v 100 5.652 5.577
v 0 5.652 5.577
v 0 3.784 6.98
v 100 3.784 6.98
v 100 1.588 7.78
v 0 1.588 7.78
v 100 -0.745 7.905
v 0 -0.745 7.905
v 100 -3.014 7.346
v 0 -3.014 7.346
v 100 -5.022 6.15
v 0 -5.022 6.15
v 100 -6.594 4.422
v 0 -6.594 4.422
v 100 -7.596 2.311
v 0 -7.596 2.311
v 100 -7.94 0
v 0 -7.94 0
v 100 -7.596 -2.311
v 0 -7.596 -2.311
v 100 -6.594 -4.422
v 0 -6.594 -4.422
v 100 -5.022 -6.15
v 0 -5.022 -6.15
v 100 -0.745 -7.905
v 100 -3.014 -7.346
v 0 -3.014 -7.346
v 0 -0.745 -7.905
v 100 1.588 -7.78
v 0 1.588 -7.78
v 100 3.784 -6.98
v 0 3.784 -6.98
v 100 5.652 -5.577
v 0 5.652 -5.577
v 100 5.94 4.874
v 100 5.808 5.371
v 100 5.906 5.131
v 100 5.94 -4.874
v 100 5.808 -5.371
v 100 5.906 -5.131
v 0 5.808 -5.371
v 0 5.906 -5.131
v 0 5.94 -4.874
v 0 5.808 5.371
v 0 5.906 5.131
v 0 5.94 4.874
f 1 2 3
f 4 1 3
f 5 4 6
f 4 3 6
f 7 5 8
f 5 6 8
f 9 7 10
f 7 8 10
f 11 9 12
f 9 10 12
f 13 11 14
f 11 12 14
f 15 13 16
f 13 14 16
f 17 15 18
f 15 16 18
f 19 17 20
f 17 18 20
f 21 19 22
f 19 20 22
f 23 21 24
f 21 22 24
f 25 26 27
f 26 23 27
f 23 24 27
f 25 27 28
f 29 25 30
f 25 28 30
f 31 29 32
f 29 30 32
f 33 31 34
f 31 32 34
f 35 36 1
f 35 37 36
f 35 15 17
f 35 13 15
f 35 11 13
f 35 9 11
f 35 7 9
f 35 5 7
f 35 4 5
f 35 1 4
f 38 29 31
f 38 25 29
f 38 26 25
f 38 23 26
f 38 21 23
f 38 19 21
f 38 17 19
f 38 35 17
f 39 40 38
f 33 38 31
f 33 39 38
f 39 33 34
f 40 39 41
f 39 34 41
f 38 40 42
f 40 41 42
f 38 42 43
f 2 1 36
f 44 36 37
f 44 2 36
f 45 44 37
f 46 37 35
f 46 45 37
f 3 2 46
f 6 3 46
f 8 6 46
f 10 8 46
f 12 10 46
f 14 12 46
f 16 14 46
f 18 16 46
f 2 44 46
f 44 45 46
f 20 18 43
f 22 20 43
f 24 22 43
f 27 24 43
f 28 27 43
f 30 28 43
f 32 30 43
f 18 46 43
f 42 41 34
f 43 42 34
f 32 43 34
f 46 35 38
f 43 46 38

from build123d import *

# Parameters (mm, degrees)
SKETCH1_R           = 7.94
BOSS_EXTRUDE1_DEPTH = 100
SKETCH2_W           = 10.691765032
SKETCH2_H           = 3.27703882
SKETCH2_W_2         = 8.911923052
CUT_EXTRUDE1_DEPTH  = 101
FILLET1_R           = 1


with BuildPart() as part:
    # Sketch1 → Boss-Extrude1 (new body)
    with BuildSketch(Plane(origin=(0, 0, 0), x_dir=(0, 0, -1), z_dir=(1, 0, 0))):
        Circle(SKETCH1_R)
    extrude(amount=BOSS_EXTRUDE1_DEPTH)

    # Sketch2 → Cut-Extrude1 (cut, through all)
    with BuildSketch(Plane(origin=(100, 0, 0), x_dir=(0, 0, -1), z_dir=(1, 0, 0))):
        with Locations((-5.345882516, 7.57851941)):
            Rectangle(SKETCH2_W, SKETCH2_H)
        with Locations((4.455961526, 7.57851941)):
            Rectangle(SKETCH2_W_2, SKETCH2_H)
    extrude(amount=-CUT_EXTRUDE1_DEPTH, mode=Mode.SUBTRACT)

    # Fillet1
    fillet1_edges = [part.edges().sort_by_distance(p)[0] for p in [
        (50, 5.94, -5.268775949),
        (50, 5.94, 5.268775949),
    ]]
    fillet(fillet1_edges, radius=FILLET1_R)


solid = part.part
